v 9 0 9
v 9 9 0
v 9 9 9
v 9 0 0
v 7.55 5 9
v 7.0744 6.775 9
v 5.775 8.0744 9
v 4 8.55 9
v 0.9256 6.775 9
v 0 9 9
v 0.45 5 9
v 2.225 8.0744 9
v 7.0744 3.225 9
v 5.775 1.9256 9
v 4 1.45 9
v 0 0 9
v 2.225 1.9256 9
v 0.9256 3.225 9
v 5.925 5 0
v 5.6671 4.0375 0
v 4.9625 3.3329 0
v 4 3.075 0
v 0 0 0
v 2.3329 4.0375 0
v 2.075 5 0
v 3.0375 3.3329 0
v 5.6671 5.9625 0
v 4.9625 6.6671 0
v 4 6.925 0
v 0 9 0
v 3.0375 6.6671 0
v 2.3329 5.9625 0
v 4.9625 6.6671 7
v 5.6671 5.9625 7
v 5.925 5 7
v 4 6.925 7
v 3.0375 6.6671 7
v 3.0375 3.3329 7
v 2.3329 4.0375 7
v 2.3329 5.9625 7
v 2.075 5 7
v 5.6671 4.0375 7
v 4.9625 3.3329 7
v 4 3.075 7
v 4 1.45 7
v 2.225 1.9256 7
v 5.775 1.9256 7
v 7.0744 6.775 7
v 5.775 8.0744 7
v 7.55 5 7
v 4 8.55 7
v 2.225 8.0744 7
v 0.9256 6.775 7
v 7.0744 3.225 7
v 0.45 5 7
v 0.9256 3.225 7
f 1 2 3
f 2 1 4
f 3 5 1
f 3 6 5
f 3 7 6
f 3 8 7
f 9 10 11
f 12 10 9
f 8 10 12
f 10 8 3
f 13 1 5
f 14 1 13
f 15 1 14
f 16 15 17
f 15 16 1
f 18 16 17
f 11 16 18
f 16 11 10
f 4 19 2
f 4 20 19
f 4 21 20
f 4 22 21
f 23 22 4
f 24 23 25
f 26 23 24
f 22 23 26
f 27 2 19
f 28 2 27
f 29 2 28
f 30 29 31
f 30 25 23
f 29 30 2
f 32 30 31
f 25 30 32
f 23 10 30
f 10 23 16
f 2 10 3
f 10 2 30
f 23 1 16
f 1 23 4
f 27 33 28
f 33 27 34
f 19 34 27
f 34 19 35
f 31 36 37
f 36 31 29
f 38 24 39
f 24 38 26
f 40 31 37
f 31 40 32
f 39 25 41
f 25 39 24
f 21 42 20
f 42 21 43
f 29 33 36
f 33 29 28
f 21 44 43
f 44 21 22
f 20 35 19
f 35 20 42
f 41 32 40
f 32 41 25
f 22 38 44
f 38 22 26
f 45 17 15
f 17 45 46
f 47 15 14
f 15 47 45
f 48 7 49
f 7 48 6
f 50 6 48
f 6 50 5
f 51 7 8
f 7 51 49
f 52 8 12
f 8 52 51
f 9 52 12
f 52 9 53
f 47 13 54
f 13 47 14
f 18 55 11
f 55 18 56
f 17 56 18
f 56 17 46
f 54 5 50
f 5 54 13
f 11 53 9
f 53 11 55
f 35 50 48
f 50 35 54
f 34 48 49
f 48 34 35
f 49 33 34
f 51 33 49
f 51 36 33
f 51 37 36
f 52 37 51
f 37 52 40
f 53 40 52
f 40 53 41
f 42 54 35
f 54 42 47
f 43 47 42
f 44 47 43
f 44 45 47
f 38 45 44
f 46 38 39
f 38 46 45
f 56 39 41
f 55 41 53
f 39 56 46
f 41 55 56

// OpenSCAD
// file: configuration.scad
// Increase this if your slicer or printer make holes too tight.
extra_radius = 0.30;

// OD = outside diameter, corner to corner.
//六角螺母
m3_nut_od = 6.1;
m3_nut_radius = m3_nut_od/2 + 0.2 + extra_radius;
m4_nut_od = 8;
m4_nut_radius = m4_nut_od/2 + 0.2 +extra_radius;
m3_nut_height = 2.4;
m4_nut_height = 3.2;

// Major diameter of metric 3mm thread.
m3_major = 2.85;
m3_radius = m3_major/2 + extra_radius;
m3_wide_radius = m3_major/2 + extra_radius + 0.2;

// NEMA17 stepper motors.
motor_shaft_diameter = 5;
motor_shaft_radius = motor_shaft_diameter/2 + extra_radius;

// Frame brackets. M3x8mm screws work best with 3.6 mm brackets.
thickness = 3.6;

// OpenBeam or Misumi. Currently only 15x15 mm, but there is a plan
// to make models more parametric and allow 20x20 mm in the future.
//extrusion = 15;
extrusion = 20;
//extrusion_block_width = 2.5; //15x15
extrusion_block_width = 6.1; //20x20

//corner_radius = 36; //15x15
corner_radius = 40; //20x20

//extrusion_offset = 0;//15x15
extrusion_offset = -2.5; //20x20

//height_offset = 0; //15x15
height_offset = -extrusion_offset; //20x20

//screw_offset=-7.5; //15x15
screw_offset=-12; //20x20
// main file
include <configuration.scad>

ramp_width = 60.2 + 2*extra_radius;
arduino_width = 53.5 + 2*extra_radius;

module m3_nut()
{
	difference()
	{
		cylinder(r=m3_nut_radius,h=4,$fn=6);
		translate([-5,m3_radius,3])cube([10,10,1]);
		translate([-5,-10-m3_radius,3])cube([10,10,1]);
	}
}

module ramp_bottom()
{
	difference()
	{
		union()
		{
			difference()
			{
				cube([ramp_width+16,120,18]);
				translate([8,0,2])cube([ramp_width,110,16]);
				//usb
				translate([ramp_width+8-9.5-13-extra_radius,100,4+2-0.5])cube([13,20,13]);
			}
			translate([8,0,2])cube([ramp_width-arduino_width,110,12]);
			//安装耳
			translate([-12,-10,0])cube([ramp_width+16+24,10,18]);
		}
		//安装孔
		for(x=[-6,ramp_width+16+6])
		{
			translate([x,2,11])rotate([90,0,0])cylinder(r=m3_wide_radius,h=20,$fn=12);
			translate([x,1,11])rotate([90,0,0])cylinder(r=m3_nut_radius,h=4,$fn=12);
		}
		for(x=[4,ramp_width+16-4])
			for(y=[11,120-10-15])
			translate([x,y,0])
			{
				cylinder(r=m3_wide_radius,h=20,$fn=12);
				m3_nut();
			}
		translate([38,115,0])
		{
			cylinder(r=m3_wide_radius,h=20,$fn=12);
			m3_nut();
		}
	}
}

module ramp_top()
{
	difference()
	{
		translate([-1,-10,0])cube([9,110+10+10,10]);
		for(y=[15:20:90])
			translate([-1,y,0])cube([10,15,4]);
		translate([-1,-3,0])cube([10,10,4]);
		translate([-1,102,0])cube([10,10,4]);
		for(y=[11,120-10-15])
		{
			translate([4,y,0])cylinder(r=m3_wide_radius,h=50,$fn=12);
			translate([4,y,7])cylinder(r=m3_nut_radius,h=3,$fn=12);
		}
	}
}

module ramp_ya()
{
	difference()
	{
		cube(9,10,10);
		translate([4,5,0])cylinder(r=m3_wide_radius,h=50,$fn=12);
		translate([4,5,7])cylinder(r=m3_nut_radius,h=3,$fn=12);
	}
}

//translate([0,0,18])
ramp_ya();
//ramp_bottom();
//translate([ramp_width+8,0,18])
//ramp_top();
